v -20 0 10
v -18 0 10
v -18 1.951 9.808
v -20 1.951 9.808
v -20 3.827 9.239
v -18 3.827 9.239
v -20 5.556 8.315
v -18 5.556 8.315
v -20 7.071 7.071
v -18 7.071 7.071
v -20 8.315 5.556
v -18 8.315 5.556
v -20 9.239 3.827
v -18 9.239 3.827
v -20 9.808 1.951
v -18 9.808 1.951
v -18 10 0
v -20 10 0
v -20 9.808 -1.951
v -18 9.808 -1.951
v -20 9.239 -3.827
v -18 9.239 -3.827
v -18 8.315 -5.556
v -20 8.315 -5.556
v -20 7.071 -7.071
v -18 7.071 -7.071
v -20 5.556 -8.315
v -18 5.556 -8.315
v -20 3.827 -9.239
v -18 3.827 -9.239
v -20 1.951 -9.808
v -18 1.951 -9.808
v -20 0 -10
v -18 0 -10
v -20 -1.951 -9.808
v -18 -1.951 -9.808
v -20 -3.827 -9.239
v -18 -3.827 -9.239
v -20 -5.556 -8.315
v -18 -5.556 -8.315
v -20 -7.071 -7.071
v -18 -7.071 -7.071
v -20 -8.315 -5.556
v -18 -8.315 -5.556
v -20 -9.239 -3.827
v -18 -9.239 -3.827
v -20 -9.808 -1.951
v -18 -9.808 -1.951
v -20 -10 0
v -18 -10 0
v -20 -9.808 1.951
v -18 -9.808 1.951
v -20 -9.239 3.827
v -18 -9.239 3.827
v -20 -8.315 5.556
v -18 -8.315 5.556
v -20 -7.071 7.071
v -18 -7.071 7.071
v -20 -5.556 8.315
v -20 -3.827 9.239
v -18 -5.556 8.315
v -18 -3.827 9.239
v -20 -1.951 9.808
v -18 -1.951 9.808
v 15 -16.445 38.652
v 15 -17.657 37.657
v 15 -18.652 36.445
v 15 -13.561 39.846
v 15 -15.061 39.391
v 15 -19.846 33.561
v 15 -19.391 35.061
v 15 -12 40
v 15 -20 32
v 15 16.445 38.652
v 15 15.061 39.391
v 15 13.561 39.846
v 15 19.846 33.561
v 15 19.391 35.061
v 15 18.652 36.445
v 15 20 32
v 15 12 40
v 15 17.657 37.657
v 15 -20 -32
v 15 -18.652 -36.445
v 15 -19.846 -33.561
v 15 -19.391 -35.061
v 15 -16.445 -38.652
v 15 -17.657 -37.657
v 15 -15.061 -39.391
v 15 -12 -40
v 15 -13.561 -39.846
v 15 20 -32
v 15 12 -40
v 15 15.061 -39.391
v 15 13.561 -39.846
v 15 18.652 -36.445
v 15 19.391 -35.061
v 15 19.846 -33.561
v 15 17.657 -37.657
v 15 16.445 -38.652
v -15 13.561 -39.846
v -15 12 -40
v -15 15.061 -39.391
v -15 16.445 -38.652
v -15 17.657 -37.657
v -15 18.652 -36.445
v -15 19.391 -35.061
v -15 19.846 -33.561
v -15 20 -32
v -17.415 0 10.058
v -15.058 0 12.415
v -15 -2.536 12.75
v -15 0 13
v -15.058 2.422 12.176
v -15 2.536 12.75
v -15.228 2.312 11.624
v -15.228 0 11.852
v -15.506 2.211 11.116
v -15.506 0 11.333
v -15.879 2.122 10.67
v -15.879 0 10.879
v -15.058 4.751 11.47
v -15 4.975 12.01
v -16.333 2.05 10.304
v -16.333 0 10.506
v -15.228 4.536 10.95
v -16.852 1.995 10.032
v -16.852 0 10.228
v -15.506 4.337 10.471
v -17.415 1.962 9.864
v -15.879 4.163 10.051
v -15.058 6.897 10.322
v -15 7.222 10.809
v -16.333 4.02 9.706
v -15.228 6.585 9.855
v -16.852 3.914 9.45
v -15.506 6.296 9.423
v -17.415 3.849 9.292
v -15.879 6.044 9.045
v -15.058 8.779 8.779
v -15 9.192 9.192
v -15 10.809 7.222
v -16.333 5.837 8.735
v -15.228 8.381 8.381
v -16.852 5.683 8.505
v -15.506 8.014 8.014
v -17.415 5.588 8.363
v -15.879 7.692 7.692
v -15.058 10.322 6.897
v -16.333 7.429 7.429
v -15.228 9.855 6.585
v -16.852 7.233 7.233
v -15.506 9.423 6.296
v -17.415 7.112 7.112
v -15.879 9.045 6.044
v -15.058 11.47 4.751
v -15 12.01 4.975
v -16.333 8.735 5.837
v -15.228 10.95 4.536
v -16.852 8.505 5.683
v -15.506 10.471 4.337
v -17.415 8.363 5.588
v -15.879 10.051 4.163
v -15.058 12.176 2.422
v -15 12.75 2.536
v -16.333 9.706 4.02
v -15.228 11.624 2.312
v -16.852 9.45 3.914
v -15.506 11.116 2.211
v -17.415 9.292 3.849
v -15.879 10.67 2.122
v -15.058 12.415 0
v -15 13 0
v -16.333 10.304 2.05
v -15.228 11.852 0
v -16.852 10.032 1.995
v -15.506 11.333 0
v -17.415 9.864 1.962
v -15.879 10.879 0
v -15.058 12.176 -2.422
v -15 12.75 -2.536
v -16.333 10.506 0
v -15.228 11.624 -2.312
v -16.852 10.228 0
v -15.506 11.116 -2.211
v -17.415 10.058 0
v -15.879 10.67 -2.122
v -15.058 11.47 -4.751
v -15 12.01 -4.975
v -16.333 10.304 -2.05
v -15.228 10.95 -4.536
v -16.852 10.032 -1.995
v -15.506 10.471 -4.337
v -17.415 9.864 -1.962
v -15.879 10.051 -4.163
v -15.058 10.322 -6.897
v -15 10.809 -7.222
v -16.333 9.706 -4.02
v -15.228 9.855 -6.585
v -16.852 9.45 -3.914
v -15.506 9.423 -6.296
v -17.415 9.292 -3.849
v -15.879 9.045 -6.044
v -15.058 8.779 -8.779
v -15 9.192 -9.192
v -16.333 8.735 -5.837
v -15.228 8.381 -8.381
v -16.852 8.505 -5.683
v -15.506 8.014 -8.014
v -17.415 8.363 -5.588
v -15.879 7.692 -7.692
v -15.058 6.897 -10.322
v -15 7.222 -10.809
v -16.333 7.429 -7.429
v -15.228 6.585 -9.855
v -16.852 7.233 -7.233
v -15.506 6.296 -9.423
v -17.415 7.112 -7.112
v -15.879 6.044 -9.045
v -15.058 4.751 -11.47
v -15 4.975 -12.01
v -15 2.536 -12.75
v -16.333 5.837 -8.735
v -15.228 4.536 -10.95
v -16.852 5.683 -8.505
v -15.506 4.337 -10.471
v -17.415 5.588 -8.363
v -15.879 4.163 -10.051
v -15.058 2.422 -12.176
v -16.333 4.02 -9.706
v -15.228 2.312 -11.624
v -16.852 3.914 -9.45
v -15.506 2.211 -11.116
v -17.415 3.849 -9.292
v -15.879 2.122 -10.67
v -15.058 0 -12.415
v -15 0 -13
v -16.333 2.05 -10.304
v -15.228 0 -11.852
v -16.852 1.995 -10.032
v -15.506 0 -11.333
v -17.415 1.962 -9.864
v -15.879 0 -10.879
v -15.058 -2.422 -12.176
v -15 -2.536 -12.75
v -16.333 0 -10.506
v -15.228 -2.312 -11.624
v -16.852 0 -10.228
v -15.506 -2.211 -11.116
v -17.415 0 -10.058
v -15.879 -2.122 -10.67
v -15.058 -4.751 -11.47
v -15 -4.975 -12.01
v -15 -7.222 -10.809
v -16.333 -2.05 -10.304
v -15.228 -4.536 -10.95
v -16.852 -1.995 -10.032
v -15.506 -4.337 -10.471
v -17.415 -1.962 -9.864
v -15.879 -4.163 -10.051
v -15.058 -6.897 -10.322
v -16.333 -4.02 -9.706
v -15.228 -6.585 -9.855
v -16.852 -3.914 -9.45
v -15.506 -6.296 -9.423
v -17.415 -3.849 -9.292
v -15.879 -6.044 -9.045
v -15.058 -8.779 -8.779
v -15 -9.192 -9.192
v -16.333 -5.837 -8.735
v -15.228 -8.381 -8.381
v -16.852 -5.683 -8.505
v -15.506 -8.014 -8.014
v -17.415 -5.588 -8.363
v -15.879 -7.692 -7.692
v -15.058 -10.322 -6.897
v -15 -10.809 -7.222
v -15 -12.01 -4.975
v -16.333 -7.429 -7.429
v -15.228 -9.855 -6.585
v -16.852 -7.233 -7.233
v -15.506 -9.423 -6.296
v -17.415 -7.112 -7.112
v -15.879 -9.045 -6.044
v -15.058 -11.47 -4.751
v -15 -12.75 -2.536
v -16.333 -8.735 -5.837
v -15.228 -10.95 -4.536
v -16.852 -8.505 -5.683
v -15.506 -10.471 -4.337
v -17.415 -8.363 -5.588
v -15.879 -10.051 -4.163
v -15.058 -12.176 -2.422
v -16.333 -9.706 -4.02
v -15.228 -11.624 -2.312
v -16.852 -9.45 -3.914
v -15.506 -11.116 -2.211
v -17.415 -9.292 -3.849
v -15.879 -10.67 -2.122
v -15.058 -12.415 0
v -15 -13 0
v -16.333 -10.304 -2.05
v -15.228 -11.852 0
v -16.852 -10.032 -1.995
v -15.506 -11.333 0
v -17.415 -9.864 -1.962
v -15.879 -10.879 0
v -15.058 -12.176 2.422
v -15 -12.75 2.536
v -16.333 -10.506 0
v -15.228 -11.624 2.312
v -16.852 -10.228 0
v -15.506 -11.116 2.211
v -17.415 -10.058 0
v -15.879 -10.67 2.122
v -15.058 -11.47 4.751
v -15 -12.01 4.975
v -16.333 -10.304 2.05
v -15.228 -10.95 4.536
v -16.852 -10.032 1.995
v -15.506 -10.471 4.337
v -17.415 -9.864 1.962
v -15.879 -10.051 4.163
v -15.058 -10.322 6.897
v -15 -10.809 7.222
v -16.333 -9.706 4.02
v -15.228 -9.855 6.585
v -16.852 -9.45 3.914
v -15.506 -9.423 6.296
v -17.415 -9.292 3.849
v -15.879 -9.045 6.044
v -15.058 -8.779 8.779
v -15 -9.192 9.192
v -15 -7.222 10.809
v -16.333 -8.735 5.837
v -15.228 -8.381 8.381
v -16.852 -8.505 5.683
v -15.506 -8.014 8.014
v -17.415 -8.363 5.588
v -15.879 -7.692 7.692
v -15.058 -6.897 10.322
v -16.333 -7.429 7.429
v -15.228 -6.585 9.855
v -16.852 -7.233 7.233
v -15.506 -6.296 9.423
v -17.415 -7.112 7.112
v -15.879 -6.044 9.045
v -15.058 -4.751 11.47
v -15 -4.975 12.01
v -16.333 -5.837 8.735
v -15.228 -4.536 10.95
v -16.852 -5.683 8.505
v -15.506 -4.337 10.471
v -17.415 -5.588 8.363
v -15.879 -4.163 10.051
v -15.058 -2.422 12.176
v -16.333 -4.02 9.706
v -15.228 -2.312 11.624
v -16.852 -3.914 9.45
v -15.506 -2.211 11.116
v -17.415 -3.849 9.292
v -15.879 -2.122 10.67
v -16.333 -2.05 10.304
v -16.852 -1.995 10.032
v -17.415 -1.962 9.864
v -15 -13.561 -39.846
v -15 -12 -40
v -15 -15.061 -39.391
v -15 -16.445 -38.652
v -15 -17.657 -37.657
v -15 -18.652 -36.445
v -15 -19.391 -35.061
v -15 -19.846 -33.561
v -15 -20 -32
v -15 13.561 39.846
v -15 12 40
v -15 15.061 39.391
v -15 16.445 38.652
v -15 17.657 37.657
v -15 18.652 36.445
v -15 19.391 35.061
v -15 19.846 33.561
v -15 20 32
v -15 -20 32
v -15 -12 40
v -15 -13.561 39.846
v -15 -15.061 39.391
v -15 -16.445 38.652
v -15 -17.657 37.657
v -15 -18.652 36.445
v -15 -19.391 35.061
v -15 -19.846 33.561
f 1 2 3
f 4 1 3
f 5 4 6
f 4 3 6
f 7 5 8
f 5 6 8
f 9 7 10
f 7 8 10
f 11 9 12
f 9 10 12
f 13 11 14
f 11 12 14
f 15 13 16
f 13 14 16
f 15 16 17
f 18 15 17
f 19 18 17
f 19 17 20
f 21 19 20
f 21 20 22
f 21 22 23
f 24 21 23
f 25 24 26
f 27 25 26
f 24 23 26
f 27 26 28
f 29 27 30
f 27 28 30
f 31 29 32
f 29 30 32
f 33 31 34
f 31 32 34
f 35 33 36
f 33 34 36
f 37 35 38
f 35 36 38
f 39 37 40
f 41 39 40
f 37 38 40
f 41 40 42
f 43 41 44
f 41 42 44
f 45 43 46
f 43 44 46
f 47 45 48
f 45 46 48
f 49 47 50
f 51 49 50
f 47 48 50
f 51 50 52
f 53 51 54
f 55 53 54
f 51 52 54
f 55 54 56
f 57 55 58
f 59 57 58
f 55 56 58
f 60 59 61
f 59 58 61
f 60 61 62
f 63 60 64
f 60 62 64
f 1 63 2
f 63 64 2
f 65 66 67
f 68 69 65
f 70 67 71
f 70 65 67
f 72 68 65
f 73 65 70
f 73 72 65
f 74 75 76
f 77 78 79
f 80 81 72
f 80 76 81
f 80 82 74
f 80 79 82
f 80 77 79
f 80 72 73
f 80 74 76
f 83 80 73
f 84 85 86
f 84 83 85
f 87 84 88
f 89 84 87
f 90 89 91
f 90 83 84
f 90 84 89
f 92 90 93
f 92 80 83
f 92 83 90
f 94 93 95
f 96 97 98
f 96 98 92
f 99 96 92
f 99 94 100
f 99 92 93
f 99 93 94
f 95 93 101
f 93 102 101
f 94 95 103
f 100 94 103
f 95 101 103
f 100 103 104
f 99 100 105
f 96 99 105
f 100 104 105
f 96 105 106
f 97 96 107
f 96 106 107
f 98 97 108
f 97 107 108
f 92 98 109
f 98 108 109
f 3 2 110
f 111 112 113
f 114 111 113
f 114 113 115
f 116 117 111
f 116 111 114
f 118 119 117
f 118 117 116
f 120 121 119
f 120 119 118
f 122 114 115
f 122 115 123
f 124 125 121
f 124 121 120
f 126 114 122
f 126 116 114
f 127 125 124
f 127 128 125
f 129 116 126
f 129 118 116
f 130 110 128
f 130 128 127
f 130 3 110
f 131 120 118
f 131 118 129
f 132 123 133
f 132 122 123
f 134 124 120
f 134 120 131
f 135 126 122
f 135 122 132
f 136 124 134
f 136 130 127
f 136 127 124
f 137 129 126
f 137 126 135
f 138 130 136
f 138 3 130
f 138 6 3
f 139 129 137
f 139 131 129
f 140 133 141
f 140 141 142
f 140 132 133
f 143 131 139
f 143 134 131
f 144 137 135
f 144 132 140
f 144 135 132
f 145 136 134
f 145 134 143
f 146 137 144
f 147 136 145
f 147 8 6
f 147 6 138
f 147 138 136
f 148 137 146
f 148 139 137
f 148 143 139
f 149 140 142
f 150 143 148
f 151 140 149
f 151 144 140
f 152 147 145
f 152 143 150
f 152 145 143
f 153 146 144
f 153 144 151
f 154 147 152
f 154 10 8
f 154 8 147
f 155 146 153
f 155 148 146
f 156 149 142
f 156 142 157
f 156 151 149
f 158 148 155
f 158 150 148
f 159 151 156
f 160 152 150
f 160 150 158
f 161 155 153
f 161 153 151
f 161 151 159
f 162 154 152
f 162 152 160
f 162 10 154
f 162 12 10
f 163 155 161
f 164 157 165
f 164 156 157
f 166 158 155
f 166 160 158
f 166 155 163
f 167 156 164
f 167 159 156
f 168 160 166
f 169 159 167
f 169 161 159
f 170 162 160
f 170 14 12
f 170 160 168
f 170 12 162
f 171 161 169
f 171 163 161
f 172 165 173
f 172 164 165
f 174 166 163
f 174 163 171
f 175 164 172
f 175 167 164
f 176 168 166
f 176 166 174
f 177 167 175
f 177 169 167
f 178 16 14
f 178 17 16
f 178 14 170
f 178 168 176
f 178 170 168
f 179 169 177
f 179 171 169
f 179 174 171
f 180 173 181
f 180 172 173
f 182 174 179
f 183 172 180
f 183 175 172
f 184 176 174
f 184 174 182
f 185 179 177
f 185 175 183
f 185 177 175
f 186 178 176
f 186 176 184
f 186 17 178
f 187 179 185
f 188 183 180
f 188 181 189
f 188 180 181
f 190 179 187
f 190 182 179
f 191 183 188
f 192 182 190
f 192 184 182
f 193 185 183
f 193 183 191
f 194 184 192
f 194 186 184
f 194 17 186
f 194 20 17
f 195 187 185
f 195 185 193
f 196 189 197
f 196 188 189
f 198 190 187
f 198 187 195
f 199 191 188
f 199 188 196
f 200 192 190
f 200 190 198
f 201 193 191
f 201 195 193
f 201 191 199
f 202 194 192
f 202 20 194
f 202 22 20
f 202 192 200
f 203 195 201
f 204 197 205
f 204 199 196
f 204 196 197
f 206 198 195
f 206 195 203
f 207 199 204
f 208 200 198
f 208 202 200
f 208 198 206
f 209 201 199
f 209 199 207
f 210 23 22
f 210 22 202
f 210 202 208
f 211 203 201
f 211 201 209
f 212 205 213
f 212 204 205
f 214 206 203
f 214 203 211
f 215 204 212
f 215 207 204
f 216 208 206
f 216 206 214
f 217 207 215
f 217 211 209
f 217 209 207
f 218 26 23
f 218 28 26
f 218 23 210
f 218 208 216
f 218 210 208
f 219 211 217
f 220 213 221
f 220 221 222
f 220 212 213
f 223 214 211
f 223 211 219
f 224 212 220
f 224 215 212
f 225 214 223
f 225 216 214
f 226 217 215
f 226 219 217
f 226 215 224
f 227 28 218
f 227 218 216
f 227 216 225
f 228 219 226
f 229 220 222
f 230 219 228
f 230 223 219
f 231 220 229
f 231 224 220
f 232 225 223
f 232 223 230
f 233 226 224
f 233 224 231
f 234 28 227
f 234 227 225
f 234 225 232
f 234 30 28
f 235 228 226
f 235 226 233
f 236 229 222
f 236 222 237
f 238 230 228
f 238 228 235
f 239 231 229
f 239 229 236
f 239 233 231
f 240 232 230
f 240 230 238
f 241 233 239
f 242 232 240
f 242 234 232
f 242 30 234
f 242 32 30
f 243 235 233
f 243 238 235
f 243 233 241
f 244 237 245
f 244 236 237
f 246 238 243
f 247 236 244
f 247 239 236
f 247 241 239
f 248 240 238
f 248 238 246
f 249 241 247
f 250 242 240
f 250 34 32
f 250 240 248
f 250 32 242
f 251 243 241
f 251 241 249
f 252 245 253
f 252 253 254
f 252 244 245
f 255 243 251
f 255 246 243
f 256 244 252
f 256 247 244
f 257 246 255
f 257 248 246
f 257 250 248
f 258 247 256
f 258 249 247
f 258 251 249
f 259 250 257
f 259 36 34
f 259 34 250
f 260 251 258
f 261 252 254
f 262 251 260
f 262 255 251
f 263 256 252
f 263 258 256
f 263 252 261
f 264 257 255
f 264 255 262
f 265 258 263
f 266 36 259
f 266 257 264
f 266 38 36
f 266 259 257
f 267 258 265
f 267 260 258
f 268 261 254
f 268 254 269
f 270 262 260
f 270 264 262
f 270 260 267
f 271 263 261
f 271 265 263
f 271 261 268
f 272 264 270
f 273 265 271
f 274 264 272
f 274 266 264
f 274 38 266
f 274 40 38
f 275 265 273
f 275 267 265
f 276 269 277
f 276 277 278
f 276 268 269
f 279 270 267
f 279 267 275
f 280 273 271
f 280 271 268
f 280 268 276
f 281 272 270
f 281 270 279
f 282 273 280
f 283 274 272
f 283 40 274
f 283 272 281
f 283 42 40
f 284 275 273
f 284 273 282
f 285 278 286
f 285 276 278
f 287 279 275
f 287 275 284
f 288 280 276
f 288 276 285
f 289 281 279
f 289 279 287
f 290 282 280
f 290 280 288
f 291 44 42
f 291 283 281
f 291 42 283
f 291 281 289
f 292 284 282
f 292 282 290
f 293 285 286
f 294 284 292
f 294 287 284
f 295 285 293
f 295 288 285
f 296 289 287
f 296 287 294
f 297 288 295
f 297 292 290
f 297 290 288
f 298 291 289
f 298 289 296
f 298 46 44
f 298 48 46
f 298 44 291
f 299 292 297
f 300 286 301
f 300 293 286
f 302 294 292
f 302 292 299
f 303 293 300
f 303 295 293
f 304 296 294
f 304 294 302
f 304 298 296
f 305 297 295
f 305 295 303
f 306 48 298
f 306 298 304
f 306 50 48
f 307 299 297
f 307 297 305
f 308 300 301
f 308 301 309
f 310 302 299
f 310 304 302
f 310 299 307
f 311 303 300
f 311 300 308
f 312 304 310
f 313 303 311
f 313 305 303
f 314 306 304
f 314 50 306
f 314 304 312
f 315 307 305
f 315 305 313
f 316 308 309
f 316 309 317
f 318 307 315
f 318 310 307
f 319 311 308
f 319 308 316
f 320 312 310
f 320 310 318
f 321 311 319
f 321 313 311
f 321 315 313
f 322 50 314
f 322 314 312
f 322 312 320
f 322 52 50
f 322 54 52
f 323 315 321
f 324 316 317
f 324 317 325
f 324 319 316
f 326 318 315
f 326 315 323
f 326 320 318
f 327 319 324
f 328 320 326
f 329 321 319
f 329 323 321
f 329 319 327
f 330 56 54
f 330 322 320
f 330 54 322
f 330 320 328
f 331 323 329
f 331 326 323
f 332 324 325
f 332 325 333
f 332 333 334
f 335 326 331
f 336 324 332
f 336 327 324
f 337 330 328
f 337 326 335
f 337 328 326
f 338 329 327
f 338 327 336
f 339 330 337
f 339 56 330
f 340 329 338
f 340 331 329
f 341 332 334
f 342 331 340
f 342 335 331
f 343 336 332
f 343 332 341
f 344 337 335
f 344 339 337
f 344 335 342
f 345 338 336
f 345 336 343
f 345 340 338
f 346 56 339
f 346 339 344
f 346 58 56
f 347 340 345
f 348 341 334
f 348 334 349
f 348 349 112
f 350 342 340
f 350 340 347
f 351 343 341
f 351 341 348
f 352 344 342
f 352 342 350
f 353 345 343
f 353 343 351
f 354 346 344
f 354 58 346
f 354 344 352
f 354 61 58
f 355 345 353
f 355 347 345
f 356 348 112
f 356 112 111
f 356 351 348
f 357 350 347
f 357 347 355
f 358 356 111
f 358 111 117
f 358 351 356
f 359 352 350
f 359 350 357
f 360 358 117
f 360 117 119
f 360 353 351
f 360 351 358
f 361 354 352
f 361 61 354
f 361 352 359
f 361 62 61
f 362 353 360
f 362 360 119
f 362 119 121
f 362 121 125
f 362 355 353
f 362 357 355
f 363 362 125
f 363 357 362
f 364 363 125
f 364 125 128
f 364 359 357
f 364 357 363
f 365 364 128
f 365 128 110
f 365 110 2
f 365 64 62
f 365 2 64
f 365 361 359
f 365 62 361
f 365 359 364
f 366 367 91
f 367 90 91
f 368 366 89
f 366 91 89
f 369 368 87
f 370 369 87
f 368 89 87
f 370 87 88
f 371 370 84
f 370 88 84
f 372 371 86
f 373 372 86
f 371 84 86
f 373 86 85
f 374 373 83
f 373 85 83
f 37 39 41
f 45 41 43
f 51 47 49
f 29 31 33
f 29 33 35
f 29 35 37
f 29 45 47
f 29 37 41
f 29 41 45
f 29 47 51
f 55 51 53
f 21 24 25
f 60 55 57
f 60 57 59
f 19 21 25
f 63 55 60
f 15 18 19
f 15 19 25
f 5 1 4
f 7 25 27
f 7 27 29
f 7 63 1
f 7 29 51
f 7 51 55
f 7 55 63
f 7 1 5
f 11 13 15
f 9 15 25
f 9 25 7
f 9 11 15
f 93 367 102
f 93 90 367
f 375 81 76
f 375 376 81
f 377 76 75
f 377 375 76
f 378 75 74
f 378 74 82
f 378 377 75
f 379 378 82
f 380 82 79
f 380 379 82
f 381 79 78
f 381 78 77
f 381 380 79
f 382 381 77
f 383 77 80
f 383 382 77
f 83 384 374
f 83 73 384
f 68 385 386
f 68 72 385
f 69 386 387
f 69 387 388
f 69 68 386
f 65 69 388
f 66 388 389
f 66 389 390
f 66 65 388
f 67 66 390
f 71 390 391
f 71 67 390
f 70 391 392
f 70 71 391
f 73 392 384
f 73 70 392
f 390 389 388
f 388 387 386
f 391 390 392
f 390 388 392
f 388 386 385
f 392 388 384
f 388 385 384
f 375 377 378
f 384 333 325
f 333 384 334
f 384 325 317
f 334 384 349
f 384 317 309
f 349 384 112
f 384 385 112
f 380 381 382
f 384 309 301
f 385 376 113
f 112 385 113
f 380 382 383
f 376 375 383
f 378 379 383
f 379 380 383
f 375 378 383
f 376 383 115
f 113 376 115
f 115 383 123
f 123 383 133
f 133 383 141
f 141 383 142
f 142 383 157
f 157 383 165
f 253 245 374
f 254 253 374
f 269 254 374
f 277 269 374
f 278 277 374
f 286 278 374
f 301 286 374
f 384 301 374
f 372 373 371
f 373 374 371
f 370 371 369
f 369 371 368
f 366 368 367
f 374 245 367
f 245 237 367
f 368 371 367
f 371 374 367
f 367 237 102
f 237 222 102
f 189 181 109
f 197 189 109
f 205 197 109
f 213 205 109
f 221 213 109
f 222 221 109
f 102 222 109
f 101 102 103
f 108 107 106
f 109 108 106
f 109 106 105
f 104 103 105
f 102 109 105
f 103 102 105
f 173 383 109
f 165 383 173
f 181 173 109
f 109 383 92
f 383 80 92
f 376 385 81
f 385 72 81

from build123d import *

# Parameters (mm, degrees)
SKETCH1_W           = 80
SKETCH1_H           = 40
BOSS_EXTRUDE1_DEPTH = 15
FILLET1_R           = 8
SKETCH2_R           = 10
BOSS_EXTRUDE2_DEPTH = 5
FILLET2_R           = 3


with BuildPart() as part:
    # Sketch1 → Boss-Extrude1 (new body, symmetric)
    with BuildSketch(Plane(origin=(0, 0, 0), x_dir=(0, 0, -1), z_dir=(1, 0, 0))):
        Rectangle(SKETCH1_W, SKETCH1_H)
    extrude(amount=BOSS_EXTRUDE1_DEPTH, both=True)

    # Fillet1
    fillet1_edges = [part.edges().sort_by_distance(p)[0] for p in [
        (0, -20, -40),
        (0, -20, 40),
        (0, 20, 40),
        (0, 20, -40),
    ]]
    fillet(fillet1_edges, radius=FILLET1_R)

    # Sketch2 → Boss-Extrude2 (add)
    with BuildSketch(Plane.ZY.offset(15)):
        Circle(SKETCH2_R)
    extrude(amount=BOSS_EXTRUDE2_DEPTH)

    # Fillet2
    fillet2_edges = [part.edges().sort_by_distance(p)[0] for p in [
        (-15, 0, -10),
    ]]
    fillet(fillet2_edges, radius=FILLET2_R)


solid = part.part
